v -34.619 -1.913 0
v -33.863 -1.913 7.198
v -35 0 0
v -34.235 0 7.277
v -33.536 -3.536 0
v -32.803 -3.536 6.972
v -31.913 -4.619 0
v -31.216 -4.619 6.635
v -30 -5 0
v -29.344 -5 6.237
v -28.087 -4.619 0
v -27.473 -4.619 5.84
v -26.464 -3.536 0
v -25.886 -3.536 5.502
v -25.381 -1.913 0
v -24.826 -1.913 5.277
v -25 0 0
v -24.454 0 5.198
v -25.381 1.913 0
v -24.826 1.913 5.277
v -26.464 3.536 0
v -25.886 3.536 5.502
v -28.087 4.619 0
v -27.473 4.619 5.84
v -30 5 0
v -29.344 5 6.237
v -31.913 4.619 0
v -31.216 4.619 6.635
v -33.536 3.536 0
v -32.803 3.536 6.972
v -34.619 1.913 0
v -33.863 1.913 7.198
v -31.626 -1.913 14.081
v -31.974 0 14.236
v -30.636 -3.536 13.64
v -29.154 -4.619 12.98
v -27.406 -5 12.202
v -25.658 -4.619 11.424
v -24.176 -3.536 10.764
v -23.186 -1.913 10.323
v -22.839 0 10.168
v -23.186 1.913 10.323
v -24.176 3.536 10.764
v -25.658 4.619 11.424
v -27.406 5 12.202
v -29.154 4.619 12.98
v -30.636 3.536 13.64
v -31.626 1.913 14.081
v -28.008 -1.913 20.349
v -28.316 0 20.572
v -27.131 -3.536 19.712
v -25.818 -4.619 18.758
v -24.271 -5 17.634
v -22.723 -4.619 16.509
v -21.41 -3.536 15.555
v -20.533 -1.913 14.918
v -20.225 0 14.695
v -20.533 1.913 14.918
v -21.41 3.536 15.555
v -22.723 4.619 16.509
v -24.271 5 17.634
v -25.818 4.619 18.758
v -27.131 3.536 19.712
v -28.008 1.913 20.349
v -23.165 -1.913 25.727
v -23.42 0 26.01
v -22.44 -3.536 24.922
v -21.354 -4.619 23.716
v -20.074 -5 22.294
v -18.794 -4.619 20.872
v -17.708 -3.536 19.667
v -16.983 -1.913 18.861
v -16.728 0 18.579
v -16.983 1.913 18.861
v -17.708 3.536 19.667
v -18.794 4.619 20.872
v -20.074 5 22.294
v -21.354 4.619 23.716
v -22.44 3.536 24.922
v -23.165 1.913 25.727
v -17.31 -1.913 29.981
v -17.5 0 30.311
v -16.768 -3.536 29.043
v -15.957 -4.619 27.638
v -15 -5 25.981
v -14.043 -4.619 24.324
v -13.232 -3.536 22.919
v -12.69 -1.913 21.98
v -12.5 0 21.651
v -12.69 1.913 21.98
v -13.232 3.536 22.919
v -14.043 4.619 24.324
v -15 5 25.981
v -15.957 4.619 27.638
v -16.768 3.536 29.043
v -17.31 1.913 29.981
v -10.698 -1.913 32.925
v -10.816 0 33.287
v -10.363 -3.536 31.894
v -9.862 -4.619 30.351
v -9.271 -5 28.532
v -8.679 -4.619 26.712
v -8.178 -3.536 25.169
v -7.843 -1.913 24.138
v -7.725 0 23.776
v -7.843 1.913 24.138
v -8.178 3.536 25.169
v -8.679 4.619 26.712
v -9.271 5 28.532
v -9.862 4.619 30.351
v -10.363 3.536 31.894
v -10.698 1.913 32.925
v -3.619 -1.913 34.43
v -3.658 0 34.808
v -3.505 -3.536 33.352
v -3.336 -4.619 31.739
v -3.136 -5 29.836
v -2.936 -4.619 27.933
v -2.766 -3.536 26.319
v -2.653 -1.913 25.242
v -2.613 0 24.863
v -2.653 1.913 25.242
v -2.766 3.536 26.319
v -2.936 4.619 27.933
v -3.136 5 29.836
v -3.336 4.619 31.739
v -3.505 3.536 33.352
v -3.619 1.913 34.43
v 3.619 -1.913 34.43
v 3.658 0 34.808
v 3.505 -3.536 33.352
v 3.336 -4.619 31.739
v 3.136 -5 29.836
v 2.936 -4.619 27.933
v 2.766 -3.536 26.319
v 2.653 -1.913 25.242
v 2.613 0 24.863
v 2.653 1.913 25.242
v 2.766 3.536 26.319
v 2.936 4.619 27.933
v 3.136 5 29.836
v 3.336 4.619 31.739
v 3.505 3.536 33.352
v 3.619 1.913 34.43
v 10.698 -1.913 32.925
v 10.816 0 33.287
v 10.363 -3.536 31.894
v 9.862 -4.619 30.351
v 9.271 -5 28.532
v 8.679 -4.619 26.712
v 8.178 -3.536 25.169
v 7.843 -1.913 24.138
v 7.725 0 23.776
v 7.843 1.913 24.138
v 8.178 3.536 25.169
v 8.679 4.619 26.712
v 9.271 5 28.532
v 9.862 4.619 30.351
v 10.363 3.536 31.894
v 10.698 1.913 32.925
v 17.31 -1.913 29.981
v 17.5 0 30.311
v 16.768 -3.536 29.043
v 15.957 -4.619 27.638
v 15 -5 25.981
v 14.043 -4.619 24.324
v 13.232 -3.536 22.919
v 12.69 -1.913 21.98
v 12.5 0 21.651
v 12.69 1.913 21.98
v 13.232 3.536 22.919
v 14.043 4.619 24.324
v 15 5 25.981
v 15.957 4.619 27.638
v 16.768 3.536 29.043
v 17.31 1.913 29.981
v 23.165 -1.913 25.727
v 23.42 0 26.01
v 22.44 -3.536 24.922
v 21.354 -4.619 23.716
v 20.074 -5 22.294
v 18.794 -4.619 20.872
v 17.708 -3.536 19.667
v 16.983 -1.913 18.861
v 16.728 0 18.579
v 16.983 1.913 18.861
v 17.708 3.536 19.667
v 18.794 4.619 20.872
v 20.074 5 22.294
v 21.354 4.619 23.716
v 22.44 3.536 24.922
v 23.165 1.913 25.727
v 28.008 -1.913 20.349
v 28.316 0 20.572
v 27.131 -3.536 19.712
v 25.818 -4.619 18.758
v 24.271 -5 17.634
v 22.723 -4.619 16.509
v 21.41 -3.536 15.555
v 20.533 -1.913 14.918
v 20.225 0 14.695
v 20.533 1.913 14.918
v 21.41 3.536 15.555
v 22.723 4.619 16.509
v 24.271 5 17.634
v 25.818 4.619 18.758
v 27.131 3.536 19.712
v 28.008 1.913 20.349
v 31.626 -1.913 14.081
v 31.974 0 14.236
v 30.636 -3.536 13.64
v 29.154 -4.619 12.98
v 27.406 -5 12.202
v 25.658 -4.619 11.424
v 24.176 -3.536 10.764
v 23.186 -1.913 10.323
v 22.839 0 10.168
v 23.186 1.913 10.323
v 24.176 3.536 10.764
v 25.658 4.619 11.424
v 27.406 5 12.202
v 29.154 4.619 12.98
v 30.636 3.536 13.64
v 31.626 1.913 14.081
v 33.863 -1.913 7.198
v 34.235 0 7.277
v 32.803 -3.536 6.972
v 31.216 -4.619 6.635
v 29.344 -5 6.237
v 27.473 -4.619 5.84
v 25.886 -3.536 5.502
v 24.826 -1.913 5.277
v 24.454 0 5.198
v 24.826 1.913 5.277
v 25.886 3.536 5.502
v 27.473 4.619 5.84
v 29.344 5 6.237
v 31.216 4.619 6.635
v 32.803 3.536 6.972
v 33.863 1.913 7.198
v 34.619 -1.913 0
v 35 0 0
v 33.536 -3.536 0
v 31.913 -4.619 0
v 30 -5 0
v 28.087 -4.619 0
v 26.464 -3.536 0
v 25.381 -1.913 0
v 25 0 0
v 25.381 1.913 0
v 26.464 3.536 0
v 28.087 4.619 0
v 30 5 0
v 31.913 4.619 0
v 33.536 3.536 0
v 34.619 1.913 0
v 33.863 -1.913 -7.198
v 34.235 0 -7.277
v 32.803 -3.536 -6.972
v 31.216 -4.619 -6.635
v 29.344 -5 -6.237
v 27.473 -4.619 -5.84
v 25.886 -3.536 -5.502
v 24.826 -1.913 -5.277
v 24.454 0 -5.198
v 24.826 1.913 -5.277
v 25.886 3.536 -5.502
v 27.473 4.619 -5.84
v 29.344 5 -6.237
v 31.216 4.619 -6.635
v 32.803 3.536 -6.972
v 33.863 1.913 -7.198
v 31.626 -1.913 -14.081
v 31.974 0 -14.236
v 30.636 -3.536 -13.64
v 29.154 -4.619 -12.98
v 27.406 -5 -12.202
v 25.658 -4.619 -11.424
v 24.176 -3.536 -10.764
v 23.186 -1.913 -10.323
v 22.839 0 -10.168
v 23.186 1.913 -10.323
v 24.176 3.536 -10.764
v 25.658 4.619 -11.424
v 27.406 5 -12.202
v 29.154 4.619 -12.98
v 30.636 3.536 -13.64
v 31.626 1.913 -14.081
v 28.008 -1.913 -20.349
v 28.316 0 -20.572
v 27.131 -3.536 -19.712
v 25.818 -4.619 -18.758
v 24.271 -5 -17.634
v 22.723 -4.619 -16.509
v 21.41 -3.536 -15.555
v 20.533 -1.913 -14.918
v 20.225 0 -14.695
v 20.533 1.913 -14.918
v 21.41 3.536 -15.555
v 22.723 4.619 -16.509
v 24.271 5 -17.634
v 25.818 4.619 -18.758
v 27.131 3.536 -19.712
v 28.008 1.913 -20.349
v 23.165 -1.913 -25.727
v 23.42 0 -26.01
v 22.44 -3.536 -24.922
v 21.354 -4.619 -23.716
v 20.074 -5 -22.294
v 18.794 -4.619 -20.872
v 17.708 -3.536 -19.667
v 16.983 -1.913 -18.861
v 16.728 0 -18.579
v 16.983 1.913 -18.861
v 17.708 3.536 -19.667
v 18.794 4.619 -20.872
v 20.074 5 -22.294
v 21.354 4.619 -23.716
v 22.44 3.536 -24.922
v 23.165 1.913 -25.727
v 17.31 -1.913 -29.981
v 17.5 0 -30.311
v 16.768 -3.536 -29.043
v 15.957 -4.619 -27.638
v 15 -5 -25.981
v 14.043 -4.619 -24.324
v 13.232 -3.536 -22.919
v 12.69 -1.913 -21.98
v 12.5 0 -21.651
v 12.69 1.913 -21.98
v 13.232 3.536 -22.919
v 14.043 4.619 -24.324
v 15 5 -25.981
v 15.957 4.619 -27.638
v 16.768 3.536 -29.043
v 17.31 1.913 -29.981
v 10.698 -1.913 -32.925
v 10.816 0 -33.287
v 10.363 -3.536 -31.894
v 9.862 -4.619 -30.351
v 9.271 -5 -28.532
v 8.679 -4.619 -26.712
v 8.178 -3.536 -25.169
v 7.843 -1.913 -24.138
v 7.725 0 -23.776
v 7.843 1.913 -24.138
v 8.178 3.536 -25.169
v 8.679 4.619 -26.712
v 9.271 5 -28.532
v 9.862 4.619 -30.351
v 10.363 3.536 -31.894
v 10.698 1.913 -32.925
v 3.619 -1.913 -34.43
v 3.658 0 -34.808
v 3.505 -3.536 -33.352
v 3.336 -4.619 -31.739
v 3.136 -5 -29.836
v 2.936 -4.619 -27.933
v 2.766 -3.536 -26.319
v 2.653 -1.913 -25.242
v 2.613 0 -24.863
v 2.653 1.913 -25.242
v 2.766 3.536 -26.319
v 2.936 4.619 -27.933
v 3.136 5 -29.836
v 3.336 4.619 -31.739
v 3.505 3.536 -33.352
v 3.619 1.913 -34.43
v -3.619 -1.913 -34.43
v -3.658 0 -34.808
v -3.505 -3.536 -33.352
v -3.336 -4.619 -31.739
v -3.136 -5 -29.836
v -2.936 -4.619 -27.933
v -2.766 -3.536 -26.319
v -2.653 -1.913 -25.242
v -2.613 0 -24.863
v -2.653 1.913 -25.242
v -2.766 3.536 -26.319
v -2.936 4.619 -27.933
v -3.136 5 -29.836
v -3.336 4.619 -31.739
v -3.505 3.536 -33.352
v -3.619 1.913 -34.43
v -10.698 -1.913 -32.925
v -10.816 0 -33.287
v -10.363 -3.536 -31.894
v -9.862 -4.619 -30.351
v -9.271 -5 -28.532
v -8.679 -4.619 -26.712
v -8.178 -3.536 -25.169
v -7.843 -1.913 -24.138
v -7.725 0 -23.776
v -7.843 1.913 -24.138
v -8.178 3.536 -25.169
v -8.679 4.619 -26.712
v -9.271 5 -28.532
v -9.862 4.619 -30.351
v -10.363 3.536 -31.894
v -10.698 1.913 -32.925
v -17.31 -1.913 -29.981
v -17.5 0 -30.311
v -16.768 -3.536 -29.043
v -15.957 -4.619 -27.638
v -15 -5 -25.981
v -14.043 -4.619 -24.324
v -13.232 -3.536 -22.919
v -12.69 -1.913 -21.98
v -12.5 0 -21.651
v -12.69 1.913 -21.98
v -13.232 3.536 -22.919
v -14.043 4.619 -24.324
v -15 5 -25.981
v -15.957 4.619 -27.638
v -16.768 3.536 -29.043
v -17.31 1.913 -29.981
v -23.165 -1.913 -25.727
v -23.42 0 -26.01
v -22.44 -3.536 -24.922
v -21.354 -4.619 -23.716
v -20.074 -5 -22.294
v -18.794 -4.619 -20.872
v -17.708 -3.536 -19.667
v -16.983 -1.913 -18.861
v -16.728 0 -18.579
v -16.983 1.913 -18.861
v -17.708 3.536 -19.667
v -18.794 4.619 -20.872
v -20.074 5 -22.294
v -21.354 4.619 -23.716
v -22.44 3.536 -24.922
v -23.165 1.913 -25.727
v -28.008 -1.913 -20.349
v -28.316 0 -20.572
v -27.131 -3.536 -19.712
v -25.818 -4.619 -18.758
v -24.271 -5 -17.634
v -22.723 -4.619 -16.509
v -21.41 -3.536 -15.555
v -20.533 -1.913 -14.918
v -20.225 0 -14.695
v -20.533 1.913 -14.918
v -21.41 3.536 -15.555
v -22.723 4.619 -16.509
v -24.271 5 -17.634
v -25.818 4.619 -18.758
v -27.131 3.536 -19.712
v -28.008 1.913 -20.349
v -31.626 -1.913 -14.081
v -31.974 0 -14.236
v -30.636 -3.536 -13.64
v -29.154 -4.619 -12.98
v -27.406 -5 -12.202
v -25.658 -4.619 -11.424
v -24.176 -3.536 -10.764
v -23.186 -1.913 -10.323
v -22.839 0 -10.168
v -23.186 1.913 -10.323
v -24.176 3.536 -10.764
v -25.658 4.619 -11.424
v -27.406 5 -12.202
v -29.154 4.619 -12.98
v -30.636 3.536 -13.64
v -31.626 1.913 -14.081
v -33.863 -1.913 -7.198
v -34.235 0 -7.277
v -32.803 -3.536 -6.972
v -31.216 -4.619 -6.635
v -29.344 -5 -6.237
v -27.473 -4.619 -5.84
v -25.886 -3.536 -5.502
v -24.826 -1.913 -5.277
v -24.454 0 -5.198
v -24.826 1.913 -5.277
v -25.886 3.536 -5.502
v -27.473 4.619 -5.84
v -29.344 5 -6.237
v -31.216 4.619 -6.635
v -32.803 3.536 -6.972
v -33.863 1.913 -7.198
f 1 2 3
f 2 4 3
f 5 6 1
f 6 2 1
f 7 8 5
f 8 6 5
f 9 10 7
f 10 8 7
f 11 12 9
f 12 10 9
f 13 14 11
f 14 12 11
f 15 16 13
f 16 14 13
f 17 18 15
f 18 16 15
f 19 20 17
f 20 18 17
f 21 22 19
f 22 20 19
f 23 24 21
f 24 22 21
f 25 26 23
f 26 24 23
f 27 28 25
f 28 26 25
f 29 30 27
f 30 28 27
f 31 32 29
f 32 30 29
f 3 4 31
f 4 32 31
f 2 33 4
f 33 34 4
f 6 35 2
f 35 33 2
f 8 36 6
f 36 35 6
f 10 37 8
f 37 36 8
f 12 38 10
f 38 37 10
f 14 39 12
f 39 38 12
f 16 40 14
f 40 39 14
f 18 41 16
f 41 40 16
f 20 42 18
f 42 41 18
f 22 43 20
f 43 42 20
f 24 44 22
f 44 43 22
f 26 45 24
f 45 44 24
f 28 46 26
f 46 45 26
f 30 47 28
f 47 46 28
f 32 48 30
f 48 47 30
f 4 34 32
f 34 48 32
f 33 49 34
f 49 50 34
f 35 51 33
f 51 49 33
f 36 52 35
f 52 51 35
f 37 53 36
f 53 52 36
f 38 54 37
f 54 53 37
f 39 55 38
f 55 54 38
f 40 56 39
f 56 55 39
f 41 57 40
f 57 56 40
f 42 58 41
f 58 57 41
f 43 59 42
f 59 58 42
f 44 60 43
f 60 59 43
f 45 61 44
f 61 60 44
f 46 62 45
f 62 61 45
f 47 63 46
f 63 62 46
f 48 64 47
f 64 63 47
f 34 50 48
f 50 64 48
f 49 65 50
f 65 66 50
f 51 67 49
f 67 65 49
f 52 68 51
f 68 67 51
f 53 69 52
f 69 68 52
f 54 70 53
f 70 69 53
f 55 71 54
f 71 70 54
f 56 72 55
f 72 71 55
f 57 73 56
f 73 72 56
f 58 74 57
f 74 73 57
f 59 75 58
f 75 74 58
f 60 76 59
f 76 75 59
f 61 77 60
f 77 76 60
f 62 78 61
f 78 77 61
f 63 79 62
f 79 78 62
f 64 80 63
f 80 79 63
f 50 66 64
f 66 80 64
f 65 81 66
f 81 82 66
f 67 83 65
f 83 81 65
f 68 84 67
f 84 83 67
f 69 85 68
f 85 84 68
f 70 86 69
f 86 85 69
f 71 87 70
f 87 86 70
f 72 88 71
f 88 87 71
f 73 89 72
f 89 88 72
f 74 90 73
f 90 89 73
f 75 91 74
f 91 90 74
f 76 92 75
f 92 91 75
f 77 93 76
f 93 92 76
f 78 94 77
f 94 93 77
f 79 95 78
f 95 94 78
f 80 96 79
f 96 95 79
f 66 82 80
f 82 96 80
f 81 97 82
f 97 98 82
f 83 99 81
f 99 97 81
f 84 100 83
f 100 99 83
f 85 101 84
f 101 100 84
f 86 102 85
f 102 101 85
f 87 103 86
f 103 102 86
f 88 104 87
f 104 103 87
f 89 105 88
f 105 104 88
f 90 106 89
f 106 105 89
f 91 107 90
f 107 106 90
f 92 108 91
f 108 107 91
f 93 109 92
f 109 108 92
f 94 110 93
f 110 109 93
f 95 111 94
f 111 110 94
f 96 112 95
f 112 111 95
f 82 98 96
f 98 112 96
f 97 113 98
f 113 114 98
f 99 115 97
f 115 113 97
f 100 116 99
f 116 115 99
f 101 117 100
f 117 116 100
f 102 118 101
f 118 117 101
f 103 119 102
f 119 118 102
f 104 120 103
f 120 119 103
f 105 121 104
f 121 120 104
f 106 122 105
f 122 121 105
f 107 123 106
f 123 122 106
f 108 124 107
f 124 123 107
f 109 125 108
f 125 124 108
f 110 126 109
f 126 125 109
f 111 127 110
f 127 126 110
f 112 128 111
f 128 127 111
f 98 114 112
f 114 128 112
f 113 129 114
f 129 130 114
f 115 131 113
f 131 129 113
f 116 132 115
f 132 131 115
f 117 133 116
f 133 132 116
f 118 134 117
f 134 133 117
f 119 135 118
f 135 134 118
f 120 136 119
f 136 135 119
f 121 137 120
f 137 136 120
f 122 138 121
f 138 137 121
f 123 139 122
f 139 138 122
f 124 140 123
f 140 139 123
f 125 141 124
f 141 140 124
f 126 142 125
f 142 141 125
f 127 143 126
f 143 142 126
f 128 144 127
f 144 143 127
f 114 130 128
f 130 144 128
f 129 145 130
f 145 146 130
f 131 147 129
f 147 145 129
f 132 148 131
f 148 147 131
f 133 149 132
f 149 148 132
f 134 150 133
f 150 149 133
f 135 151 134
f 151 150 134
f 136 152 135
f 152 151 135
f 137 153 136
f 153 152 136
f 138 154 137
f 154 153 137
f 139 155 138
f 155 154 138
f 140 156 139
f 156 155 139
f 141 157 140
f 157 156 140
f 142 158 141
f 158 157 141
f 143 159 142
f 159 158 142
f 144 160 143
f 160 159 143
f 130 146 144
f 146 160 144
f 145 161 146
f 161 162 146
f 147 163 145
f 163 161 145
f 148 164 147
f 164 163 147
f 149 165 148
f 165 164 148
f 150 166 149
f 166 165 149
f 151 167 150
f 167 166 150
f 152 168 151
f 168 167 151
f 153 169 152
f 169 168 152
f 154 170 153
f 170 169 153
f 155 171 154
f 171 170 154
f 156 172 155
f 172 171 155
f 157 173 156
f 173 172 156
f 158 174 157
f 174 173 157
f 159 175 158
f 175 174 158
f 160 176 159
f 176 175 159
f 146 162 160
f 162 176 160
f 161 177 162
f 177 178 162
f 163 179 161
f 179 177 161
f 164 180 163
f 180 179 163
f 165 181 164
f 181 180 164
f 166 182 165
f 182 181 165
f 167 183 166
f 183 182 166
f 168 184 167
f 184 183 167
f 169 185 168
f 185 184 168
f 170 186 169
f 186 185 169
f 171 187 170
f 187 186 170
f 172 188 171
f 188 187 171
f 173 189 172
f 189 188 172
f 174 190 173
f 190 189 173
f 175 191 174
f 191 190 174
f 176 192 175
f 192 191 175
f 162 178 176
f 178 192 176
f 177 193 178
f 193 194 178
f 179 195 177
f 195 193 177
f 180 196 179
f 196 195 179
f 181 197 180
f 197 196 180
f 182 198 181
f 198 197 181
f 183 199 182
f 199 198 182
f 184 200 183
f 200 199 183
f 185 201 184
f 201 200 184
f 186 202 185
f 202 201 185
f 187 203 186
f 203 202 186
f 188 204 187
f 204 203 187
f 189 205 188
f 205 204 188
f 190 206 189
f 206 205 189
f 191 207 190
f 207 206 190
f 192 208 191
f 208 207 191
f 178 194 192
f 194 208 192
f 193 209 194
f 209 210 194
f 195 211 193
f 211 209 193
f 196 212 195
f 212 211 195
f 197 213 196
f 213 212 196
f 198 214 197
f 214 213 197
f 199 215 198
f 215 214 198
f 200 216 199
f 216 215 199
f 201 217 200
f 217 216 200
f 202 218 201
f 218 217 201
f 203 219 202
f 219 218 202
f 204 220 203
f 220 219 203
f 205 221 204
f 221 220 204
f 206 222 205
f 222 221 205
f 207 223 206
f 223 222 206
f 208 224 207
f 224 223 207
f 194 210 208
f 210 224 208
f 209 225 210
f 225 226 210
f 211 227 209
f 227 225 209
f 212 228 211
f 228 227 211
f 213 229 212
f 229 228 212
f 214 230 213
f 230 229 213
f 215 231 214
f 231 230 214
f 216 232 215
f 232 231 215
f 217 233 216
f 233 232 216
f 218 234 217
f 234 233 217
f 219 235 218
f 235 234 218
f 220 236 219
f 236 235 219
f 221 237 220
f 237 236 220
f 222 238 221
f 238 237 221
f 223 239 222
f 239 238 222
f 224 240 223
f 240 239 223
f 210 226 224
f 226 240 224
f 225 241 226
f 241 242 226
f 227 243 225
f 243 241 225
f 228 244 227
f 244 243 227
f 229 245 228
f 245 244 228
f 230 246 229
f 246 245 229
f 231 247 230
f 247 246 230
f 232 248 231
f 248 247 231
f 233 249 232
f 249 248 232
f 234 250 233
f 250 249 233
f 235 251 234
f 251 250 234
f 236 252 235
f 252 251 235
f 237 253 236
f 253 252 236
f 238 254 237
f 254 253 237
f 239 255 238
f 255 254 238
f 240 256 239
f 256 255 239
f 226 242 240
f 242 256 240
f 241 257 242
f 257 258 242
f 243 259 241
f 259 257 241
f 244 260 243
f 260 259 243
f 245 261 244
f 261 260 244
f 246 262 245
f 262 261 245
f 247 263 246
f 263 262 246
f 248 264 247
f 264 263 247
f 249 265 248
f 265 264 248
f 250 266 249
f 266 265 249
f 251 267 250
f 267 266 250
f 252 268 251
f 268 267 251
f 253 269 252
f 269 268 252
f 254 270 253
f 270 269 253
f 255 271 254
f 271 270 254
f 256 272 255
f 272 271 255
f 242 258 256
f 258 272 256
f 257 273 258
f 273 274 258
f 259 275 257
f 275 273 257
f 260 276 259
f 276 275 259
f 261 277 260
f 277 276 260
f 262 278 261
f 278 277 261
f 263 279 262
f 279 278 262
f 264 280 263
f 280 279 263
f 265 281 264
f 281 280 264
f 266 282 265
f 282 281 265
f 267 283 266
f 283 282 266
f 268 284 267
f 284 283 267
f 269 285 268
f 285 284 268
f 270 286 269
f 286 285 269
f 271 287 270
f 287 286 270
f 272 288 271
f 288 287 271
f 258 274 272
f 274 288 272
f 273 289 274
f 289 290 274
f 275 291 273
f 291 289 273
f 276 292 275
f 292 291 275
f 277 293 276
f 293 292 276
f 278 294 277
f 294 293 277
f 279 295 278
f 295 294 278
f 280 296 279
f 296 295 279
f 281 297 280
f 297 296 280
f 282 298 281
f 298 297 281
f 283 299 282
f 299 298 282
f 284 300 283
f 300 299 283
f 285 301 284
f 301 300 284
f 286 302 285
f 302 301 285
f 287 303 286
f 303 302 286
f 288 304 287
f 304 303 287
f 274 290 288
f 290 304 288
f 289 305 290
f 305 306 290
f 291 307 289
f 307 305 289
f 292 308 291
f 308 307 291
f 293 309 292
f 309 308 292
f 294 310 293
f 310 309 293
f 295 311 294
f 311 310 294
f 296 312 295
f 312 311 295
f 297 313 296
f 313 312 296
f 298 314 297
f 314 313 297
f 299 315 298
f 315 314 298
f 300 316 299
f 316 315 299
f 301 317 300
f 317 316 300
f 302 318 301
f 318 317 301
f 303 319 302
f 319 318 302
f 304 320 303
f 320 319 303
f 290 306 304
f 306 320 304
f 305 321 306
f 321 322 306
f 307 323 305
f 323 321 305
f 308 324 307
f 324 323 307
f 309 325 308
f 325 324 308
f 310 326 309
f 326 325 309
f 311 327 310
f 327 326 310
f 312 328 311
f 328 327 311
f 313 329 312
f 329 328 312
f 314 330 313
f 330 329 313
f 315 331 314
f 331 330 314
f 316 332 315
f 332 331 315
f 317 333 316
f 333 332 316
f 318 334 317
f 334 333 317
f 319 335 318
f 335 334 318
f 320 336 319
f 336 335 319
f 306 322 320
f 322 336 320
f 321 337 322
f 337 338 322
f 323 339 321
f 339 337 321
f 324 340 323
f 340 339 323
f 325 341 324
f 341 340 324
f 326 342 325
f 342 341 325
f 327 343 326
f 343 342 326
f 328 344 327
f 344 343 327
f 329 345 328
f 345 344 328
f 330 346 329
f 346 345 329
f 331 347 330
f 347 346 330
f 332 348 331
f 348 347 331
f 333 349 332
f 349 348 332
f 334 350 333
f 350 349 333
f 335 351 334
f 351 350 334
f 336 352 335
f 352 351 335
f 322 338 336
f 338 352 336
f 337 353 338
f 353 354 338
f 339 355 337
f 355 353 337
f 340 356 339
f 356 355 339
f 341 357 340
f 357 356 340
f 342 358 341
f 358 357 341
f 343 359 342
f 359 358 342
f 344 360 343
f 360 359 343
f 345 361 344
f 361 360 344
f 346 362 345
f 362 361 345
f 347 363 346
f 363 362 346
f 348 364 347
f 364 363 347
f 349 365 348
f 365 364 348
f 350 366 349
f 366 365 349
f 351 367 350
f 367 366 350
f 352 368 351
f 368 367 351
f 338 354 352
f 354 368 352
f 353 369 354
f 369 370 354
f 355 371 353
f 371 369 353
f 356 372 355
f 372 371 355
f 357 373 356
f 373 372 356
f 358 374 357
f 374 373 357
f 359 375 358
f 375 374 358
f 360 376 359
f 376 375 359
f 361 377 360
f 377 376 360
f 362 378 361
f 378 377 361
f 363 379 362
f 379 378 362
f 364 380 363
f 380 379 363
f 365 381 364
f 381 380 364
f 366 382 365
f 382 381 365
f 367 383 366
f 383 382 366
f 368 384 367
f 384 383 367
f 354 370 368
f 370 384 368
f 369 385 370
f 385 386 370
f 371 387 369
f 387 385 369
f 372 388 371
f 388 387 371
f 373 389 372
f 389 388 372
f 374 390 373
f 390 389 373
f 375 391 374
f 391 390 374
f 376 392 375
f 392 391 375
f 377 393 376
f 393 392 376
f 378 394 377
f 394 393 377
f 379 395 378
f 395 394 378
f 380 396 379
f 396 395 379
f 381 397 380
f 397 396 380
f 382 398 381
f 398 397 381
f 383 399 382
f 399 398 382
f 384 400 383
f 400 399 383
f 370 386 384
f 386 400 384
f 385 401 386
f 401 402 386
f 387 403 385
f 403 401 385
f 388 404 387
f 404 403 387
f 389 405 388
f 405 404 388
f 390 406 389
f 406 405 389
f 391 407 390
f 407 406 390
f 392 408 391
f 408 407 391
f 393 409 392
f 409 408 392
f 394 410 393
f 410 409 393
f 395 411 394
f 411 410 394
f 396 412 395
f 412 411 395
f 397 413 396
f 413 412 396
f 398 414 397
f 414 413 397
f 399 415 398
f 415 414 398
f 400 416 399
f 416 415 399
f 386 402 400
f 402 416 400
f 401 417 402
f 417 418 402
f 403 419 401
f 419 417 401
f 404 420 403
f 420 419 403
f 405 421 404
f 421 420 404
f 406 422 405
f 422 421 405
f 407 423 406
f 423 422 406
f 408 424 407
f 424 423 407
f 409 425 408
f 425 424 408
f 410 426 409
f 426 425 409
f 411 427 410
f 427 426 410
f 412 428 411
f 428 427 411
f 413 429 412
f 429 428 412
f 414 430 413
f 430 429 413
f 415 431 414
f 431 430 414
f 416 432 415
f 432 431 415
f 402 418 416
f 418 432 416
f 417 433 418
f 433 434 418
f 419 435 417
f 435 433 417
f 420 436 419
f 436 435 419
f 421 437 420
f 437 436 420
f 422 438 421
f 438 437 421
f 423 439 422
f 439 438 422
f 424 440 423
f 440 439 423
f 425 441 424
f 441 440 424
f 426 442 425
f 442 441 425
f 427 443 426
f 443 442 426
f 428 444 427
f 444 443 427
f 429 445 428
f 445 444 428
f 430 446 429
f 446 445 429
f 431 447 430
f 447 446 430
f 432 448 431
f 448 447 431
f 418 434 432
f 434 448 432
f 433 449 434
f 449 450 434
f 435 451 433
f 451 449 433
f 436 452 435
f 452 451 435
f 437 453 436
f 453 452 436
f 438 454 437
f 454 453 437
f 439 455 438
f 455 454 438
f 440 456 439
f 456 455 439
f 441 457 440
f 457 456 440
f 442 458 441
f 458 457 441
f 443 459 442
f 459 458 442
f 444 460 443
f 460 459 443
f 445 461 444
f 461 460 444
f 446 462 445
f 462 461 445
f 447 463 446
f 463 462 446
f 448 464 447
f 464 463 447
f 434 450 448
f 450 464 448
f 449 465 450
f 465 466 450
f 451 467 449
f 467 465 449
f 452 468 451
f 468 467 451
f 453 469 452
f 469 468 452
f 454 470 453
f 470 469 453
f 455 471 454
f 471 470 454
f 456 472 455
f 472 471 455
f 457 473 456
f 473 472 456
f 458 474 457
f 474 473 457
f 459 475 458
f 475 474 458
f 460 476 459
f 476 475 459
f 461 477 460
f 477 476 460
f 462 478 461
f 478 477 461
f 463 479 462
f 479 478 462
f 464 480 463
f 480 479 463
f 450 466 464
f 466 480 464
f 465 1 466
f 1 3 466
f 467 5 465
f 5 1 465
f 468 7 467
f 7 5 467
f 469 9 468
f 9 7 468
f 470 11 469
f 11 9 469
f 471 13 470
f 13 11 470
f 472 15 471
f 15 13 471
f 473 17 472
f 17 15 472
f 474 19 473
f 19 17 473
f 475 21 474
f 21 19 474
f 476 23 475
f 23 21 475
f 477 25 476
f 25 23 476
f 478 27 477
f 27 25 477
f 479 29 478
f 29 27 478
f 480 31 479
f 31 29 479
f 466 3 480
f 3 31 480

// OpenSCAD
ring();

module assembly() {
    difference() {
        translate([-5,-30,0]) {
            rotate([0,0,45]) {
                translate([1430.95,13.97,0]) {
                    import("../../../externals/Mermaid_High_Heel_Shoe/Mermaid_High-Heel_Shoe.stl");
                }
            }
        }

        translate([20,0,173]) {
            ring();
        }
    }
}

module ring() {
    rotate([90,0,0]) {
        rotate_extrude(angle=360) {
            translate([30,0]) {
                circle(d=10);
            }
        }
    }
}
